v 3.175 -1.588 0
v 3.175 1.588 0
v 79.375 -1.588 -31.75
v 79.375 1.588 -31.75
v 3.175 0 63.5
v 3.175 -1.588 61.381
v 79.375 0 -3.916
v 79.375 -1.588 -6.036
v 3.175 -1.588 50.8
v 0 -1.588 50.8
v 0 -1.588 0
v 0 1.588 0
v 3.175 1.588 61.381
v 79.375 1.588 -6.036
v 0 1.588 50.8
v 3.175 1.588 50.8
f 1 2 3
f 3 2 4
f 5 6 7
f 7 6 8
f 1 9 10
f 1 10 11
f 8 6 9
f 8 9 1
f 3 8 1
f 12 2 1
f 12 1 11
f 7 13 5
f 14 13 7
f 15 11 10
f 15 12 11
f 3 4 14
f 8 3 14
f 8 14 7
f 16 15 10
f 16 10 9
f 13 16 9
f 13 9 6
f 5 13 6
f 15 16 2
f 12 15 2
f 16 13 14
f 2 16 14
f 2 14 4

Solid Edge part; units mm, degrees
sketch "Sketch1" plane through (0, 0, 0) normal (0, -1, 0) x (1, 0, 0)
  line L0 (79.375, -3.9161) -> (3.175, 63.5)
  line L1 (3.175, 50.8) -> (3.175, 63.5)
  line L2 (0, 50.8) -> (3.175, 50.8)
  line L3 (0, 0) -> (0, 50.8)
  line L4 (3.175, 0) -> (0, 0)
  line L5 (3.175, 0) -> (79.375, -31.75)
  line L6 (79.375, -31.75) -> (79.375, -3.9161)
extrude "Protrusion1" add sketch "Sketch1" along normal mid plane 3.175
chamfer "Chamfer_1" distance 1.5875 angle 45 2 edges at (41.275, -1.5875, 29.792) (41.275, 1.5875, 29.792)
